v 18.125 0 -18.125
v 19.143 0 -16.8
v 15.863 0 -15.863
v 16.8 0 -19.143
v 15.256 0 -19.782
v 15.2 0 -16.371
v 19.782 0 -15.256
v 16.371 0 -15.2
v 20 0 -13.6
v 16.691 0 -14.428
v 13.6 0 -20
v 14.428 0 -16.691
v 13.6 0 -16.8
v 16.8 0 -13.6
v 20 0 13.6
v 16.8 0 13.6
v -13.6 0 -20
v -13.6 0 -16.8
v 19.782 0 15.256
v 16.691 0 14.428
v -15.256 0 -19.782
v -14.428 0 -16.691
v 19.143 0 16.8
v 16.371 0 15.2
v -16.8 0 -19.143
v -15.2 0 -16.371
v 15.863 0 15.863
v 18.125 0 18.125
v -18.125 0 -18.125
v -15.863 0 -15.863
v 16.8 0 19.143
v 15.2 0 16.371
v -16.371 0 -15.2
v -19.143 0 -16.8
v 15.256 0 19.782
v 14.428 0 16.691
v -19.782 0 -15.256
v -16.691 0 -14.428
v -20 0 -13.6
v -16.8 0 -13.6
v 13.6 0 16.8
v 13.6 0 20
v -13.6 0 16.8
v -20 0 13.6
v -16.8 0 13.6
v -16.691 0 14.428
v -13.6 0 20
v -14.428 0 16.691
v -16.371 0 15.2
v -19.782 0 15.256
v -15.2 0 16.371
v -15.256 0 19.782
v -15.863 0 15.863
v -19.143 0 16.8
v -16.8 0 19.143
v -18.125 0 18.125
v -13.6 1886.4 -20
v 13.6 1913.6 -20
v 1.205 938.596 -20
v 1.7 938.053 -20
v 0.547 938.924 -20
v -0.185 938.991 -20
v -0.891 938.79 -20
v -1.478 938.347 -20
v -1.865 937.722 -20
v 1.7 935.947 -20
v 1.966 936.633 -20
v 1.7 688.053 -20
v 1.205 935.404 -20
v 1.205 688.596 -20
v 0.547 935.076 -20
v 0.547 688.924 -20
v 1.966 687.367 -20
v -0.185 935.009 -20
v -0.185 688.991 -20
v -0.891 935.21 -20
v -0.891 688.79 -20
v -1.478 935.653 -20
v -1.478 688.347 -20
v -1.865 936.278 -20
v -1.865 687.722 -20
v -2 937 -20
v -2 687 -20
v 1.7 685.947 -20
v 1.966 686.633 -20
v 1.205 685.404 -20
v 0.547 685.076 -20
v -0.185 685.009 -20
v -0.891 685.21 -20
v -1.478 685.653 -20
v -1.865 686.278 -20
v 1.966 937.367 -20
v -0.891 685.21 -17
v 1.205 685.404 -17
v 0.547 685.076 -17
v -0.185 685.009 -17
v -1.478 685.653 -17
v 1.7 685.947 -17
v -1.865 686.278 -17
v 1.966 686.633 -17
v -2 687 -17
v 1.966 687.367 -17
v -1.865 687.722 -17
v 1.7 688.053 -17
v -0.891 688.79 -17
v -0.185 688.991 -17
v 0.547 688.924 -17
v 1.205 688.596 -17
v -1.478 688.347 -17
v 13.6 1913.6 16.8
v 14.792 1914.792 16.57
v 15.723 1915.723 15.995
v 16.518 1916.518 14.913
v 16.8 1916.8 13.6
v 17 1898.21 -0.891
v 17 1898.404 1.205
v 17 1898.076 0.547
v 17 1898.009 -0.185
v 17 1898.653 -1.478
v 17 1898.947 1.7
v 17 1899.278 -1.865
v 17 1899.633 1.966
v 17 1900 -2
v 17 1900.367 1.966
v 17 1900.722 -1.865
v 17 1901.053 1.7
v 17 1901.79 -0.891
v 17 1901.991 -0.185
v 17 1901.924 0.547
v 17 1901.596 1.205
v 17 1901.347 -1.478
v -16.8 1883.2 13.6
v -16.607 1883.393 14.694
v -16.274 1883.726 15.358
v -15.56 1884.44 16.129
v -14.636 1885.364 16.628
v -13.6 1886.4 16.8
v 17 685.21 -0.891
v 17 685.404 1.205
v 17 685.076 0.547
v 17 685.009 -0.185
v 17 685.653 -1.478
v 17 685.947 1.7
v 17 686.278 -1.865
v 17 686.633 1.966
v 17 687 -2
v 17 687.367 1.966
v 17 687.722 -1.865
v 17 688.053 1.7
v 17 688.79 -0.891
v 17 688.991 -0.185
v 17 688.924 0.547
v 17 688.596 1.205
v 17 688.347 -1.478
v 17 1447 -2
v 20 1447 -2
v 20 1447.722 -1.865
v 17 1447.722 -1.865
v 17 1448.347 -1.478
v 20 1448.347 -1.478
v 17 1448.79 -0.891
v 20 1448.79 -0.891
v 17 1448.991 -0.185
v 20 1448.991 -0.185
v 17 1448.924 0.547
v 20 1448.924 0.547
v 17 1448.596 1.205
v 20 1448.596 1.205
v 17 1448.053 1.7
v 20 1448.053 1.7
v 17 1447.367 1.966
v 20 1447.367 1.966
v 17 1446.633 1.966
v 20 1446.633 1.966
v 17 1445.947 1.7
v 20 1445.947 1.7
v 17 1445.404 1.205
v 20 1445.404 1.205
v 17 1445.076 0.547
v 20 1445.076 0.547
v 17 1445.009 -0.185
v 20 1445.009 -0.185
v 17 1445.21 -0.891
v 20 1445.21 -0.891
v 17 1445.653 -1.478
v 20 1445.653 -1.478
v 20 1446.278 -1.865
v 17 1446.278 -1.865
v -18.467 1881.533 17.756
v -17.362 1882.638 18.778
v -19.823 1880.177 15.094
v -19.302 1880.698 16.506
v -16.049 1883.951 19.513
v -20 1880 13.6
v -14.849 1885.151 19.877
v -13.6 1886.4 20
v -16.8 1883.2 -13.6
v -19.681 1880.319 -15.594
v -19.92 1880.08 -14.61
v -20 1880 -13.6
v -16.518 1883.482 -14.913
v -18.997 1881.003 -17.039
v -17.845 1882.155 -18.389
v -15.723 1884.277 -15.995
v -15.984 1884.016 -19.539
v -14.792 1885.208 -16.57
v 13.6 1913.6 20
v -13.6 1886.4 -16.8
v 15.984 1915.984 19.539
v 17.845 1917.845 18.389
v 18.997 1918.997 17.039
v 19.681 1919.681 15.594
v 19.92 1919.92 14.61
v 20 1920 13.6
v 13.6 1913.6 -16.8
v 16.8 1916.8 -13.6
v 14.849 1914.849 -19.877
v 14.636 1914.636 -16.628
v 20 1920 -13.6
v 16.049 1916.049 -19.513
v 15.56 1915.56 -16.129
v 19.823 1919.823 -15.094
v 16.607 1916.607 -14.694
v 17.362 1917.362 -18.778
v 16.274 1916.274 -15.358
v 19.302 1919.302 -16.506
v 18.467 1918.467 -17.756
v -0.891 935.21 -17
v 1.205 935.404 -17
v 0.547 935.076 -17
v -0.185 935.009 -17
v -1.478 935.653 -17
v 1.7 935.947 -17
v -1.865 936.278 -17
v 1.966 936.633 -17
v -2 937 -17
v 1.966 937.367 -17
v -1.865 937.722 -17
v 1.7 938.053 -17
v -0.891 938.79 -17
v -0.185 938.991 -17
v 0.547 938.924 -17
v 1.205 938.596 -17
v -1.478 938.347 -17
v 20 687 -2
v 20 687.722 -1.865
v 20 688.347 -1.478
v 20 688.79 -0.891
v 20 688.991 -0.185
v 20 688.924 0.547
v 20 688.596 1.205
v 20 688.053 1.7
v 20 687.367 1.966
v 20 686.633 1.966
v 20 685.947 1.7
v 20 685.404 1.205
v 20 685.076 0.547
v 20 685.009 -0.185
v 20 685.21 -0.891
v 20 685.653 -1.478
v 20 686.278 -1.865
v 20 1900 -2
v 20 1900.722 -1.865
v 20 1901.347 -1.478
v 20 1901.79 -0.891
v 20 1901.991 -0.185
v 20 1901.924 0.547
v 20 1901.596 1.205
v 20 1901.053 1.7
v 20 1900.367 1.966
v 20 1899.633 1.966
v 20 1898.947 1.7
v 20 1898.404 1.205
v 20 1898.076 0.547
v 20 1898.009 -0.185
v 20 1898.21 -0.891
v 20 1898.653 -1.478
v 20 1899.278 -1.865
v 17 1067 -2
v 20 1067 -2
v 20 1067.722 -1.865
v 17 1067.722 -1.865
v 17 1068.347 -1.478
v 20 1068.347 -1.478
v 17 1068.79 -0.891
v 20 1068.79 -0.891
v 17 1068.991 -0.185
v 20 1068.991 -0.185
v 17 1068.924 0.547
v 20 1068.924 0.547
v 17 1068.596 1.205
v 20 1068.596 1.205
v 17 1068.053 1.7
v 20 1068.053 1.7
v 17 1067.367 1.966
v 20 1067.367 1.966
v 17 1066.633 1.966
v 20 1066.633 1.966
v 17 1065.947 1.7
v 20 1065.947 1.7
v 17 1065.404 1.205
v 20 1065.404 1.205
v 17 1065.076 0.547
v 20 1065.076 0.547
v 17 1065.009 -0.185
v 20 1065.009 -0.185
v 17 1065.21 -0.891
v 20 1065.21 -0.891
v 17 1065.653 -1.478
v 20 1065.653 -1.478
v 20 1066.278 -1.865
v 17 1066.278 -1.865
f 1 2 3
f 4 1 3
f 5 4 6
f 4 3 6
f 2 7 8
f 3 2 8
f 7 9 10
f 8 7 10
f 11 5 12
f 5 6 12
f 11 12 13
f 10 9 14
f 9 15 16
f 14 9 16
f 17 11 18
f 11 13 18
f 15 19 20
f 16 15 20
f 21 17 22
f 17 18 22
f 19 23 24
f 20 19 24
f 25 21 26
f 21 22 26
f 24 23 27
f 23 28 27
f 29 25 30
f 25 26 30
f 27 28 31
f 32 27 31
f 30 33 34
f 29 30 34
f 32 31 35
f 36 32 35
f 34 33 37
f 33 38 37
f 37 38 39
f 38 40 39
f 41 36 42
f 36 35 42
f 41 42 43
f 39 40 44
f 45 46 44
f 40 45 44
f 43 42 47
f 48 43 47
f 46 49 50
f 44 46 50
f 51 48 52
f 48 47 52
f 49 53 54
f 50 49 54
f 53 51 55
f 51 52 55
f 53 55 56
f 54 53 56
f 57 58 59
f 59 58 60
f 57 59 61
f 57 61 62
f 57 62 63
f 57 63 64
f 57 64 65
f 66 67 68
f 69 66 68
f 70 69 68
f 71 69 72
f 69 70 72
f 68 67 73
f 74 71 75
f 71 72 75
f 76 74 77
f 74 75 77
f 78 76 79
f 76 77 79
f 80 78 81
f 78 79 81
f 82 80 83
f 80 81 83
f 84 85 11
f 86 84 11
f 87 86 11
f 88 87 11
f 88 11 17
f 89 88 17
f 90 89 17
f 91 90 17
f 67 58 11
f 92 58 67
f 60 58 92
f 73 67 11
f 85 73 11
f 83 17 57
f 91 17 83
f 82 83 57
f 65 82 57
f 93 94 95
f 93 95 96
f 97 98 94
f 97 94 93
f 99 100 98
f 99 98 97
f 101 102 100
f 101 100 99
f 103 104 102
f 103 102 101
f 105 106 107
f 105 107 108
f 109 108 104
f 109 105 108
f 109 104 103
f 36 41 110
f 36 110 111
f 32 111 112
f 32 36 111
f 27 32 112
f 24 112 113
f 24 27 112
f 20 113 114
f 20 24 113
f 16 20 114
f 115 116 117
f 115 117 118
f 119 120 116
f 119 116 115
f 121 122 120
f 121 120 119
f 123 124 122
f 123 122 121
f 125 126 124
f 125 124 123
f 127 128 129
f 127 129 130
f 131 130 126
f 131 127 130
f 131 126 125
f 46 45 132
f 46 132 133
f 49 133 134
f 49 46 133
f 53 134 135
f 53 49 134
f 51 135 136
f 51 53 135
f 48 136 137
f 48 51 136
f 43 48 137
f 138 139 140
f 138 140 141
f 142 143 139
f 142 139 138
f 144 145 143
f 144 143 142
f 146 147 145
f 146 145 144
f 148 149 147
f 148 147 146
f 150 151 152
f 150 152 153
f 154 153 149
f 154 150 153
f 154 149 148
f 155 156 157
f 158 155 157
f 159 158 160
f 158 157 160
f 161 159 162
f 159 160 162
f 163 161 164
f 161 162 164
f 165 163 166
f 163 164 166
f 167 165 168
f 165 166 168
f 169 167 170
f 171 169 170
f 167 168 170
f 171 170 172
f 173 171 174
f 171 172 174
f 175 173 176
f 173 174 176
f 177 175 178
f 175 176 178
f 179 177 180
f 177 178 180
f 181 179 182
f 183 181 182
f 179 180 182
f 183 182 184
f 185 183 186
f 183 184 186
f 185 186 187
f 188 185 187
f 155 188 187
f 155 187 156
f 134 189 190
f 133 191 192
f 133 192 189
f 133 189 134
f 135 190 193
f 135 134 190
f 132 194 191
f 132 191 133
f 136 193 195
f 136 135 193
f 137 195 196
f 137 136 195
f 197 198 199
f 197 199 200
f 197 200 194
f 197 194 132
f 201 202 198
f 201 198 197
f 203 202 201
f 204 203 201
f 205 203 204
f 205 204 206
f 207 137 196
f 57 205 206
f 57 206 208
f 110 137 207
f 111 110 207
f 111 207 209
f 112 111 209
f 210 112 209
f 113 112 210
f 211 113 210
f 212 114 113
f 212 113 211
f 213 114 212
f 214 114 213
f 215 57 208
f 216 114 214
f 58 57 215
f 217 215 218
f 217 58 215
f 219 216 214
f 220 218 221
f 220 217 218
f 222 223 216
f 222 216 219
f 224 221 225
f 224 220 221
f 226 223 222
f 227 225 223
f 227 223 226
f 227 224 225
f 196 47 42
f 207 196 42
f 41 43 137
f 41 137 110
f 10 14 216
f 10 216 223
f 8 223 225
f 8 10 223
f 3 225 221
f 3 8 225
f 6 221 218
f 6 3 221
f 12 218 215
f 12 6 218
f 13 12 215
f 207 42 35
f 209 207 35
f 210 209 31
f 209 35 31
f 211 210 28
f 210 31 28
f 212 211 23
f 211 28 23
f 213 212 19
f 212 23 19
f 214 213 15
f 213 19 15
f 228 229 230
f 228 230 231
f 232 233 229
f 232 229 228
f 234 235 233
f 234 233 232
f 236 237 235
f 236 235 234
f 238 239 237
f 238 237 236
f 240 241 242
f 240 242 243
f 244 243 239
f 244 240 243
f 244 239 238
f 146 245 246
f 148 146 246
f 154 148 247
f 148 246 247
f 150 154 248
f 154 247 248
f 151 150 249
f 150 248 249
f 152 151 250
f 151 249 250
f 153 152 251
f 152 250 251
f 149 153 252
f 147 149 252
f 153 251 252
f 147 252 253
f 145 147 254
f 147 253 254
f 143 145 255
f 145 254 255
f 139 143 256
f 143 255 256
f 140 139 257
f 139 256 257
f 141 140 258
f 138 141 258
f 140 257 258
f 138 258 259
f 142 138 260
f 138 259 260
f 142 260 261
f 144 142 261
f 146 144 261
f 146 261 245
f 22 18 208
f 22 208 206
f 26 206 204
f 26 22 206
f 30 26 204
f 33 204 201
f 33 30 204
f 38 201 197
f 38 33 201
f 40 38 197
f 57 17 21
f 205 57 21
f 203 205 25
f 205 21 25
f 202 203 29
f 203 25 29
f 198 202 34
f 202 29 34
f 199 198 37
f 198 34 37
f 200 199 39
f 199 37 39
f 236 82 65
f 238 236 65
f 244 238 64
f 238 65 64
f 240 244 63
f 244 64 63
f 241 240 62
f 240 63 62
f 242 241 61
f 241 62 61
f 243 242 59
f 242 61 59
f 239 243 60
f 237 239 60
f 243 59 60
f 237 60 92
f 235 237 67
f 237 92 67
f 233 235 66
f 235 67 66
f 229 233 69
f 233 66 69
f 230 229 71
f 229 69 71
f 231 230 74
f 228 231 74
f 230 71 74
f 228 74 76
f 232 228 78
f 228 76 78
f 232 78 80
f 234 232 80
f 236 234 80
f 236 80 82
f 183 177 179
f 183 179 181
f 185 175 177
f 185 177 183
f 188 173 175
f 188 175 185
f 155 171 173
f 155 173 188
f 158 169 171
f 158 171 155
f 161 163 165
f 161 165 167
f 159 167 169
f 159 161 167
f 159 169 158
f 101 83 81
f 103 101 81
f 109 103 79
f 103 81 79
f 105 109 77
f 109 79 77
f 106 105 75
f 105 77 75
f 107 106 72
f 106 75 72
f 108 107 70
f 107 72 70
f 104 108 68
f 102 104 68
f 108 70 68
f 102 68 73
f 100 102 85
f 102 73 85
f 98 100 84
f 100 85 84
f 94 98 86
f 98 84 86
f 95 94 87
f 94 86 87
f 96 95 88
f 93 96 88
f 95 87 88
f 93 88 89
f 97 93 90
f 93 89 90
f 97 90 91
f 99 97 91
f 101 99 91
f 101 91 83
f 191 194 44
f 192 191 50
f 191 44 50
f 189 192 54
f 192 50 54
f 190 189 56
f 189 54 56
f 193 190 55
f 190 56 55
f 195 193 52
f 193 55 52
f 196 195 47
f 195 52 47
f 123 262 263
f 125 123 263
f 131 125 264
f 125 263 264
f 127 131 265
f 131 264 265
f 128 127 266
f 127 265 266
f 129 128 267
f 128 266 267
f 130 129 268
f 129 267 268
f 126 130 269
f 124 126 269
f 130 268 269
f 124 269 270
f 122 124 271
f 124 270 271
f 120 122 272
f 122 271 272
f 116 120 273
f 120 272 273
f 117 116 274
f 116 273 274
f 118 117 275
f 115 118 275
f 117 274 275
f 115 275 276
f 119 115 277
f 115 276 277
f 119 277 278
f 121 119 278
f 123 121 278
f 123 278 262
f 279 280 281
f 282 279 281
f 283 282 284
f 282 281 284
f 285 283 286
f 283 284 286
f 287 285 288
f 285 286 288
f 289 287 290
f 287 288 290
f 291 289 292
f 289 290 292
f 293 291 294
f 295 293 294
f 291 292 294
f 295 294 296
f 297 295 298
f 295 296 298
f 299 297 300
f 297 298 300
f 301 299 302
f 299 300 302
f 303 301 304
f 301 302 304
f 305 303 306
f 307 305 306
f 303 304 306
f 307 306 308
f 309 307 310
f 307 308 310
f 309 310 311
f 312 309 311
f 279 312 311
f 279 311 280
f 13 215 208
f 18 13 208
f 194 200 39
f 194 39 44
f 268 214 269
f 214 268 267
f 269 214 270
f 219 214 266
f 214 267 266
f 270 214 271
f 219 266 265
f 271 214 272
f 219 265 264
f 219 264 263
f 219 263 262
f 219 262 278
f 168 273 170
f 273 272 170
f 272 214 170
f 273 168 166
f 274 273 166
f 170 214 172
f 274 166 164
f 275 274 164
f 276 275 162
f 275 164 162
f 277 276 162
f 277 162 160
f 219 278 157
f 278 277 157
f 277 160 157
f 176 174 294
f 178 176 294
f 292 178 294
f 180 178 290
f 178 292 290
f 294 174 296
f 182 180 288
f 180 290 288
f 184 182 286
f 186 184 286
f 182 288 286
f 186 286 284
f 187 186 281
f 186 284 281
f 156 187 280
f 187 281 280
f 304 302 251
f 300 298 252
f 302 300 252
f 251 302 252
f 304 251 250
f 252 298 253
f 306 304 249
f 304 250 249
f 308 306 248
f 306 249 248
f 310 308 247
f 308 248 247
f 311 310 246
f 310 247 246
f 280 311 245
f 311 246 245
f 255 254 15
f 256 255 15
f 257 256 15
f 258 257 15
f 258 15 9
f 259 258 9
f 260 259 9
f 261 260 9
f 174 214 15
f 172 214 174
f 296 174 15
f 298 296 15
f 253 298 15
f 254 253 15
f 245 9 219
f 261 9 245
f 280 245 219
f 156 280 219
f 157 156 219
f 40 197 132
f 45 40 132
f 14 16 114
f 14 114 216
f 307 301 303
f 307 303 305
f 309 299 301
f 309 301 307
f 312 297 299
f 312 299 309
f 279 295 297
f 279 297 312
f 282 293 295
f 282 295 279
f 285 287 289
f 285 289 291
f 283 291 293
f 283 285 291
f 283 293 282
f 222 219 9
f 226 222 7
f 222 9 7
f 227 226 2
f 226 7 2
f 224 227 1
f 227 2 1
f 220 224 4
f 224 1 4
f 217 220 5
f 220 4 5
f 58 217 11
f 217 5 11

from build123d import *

# Parameters (mm, degrees)
TUBE_SQUARE_40_X_40_X_3_2_1_DEPTH = 1920
CUT_EXTRUDE1_DEPTH                = 1921.52076271
SKETCH16_R                        = 2
CUT_EXTRUDE2_DEPTH                = 3
SKETCH17_R                        = 2
CUT_EXTRUDE3_DEPTH                = 3


with BuildPart() as part:
    # Sketch15 → Tube (square) 40 X 40 X 3.2(1) (new body)
    with BuildSketch(Plane(origin=(0, 0, 0), x_dir=(-1, 0, 0), z_dir=(0, 1, 0))):
        with BuildLine():
            Line((-13.6, -20), (13.6, -20))
            ThreePointArc((13.6, -20), (18.1254834, -18.1254834), (20, -13.6))
            Line((20, -13.6), (20, 13.6))
            ThreePointArc((20, 13.6), (18.1254834, 18.1254834), (13.6, 20))
            Line((13.6, 20), (-13.6, 20))
            ThreePointArc((-13.6, 20), (-18.1254834, 18.1254834), (-20, 13.6))
            Line((-20, 13.6), (-20, -13.6))
            ThreePointArc((-20, -13.6), (-18.1254834, -18.1254834), (-13.6, -20))
        make_face()
        with BuildLine():
            Line((-13.6, -16.8), (13.6, -16.8))
            ThreePointArc((13.6, -16.8), (15.8627417, -15.8627417), (16.8, -13.6))
            Line((16.8, -13.6), (16.8, 13.6))
            ThreePointArc((16.8, 13.6), (15.8627417, 15.8627417), (13.6, 16.8))
            Line((13.6, 16.8), (-13.6, 16.8))
            ThreePointArc((-13.6, 16.8), (-15.8627417, 15.8627417), (-16.8, 13.6))
            Line((-16.8, 13.6), (-16.8, -13.6))
            ThreePointArc((-16.8, -13.6), (-15.8627417, -15.8627417), (-13.6, -16.8))
        make_face(mode=Mode.SUBTRACT)
    extrude(amount=TUBE_SQUARE_40_X_40_X_3_2_1_DEPTH)

    # Sketch13 → Cut-Extrude1 (cut, through all)
    with BuildSketch(Plane(origin=(0, 0, -20), x_dir=(-1, 0, 0), z_dir=(0, 0, -1))):
        Polygon((20, 1880), (-20, 1920), (20, 1920), align=None)
    extrude(amount=-CUT_EXTRUDE1_DEPTH, mode=Mode.SUBTRACT)

    # Sketch16 → Cut-Extrude2 (cut)
    with BuildSketch(Plane(origin=(20, 0, 0), x_dir=(0, 0, -1), z_dir=(1, 0, 0))):
        with Locations((0, 1900)):
            Circle(SKETCH16_R)
        with Locations((0, 1447)):
            Circle(SKETCH16_R)
        with Locations((0, 1067)):
            Circle(SKETCH16_R)
        with Locations((0, 687)):
            Circle(SKETCH16_R)
    extrude(amount=-CUT_EXTRUDE2_DEPTH, mode=Mode.SUBTRACT)

    # Sketch17 → Cut-Extrude3 (cut)
    with BuildSketch(Plane(origin=(0, 0, -20), x_dir=(-1, 0, 0), z_dir=(0, 0, -1))):
        with Locations((0, 687)):
            Circle(SKETCH17_R)
        with Locations((0, 937)):
            Circle(SKETCH17_R)
    extrude(amount=-CUT_EXTRUDE3_DEPTH, mode=Mode.SUBTRACT)


solid = part.part
